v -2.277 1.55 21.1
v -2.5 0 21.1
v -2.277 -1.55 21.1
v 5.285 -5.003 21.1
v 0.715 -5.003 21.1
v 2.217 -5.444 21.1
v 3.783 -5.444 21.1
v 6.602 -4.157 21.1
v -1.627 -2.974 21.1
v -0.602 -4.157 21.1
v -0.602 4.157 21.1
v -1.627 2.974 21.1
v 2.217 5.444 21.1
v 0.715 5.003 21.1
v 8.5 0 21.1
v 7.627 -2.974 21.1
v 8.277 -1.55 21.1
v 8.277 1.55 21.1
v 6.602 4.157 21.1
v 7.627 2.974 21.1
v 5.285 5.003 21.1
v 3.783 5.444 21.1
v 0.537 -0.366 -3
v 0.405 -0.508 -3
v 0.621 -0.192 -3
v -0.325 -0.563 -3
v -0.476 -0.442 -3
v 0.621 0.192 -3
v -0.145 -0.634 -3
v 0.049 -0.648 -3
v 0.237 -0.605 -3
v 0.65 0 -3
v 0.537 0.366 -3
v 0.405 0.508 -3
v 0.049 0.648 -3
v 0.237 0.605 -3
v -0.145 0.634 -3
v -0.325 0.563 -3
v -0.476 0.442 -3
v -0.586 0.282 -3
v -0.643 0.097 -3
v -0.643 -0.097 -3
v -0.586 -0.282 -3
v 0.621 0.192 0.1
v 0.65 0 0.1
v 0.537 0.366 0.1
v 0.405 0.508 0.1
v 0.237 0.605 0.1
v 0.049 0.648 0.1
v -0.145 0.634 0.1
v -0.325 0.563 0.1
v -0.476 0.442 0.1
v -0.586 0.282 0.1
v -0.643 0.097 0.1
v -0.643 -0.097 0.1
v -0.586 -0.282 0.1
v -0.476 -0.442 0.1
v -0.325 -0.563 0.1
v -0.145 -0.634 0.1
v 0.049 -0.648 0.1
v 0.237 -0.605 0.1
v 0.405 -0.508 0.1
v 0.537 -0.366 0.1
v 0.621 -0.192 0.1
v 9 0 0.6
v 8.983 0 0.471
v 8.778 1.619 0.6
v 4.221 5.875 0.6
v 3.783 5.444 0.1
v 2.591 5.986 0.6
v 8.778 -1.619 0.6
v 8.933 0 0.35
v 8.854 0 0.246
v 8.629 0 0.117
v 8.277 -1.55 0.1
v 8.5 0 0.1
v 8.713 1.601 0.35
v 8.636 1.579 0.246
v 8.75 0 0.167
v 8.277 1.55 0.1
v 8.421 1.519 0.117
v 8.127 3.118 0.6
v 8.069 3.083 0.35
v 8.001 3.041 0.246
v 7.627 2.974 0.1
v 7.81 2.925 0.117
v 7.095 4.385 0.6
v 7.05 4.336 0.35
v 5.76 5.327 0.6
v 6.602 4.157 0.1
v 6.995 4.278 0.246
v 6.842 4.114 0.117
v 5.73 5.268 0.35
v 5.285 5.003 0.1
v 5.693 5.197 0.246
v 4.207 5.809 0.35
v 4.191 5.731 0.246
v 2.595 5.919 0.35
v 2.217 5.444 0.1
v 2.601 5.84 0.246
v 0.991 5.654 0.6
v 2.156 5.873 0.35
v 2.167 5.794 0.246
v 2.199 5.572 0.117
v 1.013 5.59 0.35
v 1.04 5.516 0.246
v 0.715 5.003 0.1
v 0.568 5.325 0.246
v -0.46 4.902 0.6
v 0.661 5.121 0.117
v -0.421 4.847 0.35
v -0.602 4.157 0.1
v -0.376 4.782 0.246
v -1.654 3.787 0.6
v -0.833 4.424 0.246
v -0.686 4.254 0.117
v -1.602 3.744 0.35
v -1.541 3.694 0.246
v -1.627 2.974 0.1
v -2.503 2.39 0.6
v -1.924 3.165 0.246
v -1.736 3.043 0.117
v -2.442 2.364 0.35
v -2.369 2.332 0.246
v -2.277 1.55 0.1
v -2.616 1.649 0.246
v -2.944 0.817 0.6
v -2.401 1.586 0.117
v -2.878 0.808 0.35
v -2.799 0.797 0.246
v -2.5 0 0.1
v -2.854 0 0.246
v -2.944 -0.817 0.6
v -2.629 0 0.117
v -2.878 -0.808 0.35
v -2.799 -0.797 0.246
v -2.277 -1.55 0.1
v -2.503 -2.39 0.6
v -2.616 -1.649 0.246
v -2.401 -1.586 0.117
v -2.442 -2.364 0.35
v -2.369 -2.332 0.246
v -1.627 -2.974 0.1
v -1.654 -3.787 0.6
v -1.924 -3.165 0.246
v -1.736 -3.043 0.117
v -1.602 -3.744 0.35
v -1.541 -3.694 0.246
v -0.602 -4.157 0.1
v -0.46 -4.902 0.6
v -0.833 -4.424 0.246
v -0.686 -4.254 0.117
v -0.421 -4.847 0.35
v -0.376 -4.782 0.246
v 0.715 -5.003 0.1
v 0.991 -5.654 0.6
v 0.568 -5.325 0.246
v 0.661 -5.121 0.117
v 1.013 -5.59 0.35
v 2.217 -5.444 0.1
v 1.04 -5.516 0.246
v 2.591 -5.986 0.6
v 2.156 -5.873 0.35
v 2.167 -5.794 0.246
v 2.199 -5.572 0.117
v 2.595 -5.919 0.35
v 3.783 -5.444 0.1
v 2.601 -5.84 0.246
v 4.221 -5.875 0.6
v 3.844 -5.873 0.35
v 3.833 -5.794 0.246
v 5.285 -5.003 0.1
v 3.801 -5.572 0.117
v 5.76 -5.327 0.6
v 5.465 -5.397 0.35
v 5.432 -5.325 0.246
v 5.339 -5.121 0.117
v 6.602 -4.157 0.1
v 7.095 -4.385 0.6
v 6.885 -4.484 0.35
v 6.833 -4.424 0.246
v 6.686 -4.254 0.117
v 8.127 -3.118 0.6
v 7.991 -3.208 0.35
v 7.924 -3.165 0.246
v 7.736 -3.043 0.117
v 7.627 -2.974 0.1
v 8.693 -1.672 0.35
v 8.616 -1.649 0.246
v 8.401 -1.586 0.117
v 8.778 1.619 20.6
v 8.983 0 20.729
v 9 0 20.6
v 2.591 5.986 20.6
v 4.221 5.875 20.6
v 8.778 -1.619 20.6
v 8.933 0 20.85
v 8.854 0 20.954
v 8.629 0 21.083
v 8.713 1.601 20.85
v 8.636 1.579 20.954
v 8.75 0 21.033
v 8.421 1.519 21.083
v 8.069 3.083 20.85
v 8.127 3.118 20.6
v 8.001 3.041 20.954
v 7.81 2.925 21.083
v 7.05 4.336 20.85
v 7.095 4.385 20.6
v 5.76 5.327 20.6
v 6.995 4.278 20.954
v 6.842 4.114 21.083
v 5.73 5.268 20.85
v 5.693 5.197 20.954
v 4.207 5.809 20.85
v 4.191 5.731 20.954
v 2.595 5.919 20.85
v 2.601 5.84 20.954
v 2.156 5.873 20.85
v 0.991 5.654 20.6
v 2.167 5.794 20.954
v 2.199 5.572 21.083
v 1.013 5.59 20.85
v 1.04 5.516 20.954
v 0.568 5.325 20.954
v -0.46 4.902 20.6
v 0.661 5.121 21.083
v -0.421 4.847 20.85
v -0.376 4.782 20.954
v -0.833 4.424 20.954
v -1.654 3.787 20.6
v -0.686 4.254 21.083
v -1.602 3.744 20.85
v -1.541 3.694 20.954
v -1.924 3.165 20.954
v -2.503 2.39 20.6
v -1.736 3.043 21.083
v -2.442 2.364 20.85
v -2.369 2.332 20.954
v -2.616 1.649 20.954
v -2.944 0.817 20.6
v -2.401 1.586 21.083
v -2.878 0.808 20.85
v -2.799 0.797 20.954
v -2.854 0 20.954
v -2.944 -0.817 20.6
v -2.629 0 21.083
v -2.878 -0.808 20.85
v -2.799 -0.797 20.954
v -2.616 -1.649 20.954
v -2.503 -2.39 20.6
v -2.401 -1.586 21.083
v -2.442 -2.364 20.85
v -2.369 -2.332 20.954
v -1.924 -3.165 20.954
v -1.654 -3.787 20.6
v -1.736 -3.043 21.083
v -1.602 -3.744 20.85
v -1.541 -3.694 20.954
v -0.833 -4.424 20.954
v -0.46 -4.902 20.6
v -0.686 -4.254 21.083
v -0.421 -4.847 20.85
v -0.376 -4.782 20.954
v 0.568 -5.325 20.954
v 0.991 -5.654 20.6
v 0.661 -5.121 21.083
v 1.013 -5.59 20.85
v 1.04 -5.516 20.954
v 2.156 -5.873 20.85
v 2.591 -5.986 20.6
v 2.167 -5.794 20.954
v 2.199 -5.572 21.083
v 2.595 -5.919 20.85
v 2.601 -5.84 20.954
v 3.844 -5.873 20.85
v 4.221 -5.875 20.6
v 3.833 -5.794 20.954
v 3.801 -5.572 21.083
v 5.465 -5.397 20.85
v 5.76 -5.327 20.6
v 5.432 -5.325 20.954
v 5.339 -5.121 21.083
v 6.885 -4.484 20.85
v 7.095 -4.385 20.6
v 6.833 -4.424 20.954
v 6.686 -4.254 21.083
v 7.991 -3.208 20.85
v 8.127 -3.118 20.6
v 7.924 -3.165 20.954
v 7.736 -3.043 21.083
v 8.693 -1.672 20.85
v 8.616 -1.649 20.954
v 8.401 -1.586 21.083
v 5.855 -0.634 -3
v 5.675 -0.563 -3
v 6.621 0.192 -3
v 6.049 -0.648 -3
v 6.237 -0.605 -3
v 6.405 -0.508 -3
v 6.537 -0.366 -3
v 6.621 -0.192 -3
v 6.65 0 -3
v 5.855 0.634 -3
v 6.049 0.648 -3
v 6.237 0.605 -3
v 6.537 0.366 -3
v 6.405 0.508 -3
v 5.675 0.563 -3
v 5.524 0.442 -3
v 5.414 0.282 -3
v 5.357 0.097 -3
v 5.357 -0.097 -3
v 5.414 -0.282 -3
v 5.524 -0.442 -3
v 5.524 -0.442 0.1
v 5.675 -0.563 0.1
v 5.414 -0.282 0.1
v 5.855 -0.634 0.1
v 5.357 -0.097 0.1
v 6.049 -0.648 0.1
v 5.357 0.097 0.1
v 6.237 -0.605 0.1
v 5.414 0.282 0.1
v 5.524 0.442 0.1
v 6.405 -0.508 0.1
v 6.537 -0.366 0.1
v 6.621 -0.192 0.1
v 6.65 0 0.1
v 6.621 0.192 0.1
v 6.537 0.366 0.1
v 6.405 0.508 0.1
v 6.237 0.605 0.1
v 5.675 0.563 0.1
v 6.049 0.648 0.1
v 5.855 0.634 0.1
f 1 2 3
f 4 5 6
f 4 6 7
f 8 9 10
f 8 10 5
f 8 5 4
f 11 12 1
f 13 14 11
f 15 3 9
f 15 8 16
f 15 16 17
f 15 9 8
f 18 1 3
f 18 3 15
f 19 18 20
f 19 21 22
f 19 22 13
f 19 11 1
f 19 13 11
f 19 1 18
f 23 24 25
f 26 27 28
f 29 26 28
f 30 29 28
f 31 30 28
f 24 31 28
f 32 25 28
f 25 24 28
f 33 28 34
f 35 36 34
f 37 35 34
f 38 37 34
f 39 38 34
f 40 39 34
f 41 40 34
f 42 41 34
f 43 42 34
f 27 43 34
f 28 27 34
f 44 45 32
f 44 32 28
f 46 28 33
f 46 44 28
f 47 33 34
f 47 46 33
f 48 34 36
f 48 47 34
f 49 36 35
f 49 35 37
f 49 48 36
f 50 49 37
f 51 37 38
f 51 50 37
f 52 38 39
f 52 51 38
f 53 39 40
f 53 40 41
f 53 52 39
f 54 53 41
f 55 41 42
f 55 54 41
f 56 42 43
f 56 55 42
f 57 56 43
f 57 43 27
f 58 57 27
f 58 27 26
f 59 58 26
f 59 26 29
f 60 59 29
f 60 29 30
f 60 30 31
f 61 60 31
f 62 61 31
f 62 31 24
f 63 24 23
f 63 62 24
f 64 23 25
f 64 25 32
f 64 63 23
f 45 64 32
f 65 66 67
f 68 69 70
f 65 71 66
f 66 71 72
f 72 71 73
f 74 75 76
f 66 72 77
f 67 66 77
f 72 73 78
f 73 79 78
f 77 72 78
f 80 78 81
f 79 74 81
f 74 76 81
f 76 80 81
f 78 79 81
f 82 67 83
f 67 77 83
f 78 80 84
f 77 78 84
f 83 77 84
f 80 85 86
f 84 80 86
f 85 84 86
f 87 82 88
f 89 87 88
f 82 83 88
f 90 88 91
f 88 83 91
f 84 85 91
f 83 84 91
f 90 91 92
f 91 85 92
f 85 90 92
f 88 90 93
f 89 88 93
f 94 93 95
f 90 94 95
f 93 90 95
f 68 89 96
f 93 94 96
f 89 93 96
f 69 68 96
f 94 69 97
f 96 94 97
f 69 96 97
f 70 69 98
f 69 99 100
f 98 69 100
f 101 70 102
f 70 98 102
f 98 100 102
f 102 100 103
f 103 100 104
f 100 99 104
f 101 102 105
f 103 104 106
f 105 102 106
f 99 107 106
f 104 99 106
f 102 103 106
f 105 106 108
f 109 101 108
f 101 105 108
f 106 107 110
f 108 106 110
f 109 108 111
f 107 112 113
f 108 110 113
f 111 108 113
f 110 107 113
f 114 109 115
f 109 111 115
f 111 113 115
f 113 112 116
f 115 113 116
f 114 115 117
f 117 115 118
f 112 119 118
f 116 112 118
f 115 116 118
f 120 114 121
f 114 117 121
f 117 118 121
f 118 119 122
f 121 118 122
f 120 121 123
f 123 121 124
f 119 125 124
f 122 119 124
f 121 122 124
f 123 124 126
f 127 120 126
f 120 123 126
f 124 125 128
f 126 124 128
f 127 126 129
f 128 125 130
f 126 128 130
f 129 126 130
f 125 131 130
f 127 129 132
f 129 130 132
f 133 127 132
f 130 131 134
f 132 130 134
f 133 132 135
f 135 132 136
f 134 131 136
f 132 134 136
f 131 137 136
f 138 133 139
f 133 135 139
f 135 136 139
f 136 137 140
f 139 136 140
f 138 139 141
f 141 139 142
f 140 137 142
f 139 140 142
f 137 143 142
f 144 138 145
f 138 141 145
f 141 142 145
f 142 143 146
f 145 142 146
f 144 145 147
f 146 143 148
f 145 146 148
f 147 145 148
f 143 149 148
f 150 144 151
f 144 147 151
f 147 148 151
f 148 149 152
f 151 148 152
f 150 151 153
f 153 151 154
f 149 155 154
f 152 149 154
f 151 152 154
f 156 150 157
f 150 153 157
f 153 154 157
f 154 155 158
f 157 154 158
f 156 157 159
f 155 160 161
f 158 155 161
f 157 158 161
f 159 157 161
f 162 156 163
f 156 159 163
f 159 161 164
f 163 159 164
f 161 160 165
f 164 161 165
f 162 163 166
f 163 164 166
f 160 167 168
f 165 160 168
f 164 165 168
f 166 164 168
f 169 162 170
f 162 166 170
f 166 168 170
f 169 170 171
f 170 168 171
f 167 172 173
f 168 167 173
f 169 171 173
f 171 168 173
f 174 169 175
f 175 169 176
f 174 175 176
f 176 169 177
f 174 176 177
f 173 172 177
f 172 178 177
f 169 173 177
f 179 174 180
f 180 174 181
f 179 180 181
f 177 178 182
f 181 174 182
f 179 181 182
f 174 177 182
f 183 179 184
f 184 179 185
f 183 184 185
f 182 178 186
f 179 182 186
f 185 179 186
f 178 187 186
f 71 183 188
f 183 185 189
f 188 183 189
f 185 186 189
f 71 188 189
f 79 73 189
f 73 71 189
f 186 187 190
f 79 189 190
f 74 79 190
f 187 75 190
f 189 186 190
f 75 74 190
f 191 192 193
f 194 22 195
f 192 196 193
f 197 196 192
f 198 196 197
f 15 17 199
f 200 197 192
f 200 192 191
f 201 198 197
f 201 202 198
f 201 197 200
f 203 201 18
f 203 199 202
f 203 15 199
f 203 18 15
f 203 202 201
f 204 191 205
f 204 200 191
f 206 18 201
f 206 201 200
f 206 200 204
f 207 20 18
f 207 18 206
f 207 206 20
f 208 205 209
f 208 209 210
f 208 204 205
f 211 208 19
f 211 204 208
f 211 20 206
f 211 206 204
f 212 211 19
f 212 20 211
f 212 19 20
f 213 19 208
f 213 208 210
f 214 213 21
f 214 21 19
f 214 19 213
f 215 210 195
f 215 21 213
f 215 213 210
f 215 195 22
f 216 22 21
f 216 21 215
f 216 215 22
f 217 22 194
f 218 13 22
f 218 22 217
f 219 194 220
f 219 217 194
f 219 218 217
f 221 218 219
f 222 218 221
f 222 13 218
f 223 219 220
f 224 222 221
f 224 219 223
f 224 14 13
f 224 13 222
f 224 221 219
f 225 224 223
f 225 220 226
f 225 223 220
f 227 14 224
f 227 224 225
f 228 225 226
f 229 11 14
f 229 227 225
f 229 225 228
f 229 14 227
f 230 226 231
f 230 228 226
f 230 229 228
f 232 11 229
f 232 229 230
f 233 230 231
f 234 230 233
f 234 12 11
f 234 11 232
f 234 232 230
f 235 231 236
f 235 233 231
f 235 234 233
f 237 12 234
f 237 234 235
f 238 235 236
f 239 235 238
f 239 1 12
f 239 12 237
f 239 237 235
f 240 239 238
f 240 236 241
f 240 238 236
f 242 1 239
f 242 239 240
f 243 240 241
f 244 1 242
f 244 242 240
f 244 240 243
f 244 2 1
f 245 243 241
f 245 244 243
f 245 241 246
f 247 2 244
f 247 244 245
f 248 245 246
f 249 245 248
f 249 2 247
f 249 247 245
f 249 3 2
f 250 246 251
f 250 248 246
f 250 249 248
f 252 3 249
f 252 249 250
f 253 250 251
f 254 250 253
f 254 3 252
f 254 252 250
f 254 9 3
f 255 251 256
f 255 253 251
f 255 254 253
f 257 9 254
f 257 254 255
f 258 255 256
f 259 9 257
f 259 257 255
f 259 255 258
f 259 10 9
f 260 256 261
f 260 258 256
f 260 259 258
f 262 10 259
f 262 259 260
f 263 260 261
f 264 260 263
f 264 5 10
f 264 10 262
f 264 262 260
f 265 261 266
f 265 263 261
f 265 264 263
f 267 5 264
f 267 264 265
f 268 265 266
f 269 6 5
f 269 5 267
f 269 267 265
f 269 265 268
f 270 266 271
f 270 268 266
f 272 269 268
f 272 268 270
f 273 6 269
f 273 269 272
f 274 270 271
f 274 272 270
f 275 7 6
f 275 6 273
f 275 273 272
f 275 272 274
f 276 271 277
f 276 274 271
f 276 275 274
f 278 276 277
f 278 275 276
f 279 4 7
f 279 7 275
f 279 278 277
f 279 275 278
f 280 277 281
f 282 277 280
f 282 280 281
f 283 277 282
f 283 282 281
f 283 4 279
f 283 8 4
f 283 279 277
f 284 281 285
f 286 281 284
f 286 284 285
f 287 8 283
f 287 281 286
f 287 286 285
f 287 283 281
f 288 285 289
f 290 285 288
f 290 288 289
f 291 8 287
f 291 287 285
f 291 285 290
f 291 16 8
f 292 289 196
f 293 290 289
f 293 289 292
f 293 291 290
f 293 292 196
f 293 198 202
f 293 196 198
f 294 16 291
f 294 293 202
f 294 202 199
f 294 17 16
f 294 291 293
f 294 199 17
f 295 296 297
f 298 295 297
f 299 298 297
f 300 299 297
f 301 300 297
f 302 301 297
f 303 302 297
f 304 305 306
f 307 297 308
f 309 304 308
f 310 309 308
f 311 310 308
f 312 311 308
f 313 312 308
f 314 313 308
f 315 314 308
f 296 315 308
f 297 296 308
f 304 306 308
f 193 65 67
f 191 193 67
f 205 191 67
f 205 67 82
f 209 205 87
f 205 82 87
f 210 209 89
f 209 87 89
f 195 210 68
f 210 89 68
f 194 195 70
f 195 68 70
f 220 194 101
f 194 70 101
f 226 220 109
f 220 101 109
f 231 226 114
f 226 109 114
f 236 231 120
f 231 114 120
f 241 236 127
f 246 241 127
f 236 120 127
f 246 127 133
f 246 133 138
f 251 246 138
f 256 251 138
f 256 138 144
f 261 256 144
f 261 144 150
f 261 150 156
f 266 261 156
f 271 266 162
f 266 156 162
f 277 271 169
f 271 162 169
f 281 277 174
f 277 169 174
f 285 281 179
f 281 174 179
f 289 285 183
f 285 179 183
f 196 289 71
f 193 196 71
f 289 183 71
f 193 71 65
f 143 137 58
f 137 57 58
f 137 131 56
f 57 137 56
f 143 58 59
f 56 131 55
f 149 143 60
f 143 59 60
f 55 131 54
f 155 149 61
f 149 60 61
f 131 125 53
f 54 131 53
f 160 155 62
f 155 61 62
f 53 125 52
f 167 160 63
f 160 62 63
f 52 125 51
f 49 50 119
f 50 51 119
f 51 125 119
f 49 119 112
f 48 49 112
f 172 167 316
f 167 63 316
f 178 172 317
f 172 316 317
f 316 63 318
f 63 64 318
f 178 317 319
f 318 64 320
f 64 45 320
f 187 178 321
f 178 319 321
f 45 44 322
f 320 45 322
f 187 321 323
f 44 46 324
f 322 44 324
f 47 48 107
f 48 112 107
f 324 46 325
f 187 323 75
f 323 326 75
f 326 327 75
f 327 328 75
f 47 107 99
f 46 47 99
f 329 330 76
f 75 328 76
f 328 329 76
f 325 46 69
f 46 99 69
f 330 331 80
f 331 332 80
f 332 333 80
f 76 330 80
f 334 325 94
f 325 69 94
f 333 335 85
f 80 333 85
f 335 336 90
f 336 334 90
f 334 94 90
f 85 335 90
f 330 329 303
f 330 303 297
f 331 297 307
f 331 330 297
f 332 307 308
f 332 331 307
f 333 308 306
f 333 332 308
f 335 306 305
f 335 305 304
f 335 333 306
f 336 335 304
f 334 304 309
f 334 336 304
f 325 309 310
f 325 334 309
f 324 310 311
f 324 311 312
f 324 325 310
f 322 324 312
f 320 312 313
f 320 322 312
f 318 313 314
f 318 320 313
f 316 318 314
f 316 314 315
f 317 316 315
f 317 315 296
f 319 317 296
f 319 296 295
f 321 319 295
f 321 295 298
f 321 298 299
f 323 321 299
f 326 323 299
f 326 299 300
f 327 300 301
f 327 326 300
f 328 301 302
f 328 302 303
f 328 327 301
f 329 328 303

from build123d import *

# Parameters (mm, degrees)
SKETCH001_R       = 0.65
PAD001_DEPTH      = 10.5
PAD001_DEPTH_BACK = 3.5
SKETCH_R          = 6
PAD_DEPTH         = 21
FILLET_R          = 0.5


with BuildPart() as pad001:
    # Sketch001 → Pad001 (new body, two sides)
    with BuildSketch(Plane.XY.offset(0.5)) as pad001_sk:
        Circle(SKETCH001_R)
        with Locations((6, 0)):
            Circle(SKETCH001_R)
    extrude(amount=PAD001_DEPTH)
    extrude(pad001_sk.sketch, amount=-PAD001_DEPTH_BACK)


with BuildPart() as l_radial_d12_0mm_p6_00mm_murata_1900r:
    # Sketch → Pad (new body)
    with BuildSketch(Plane.XY.offset(0.1)):
        with Locations((3, 0)):
            Circle(SKETCH_R)
    extrude(amount=PAD_DEPTH)

    # Fillet
    fillet_edges = [l_radial_d12_0mm_p6_00mm_murata_1900r.edges().sort_by_distance(p)[0] for p in [
        (-3, 0, 0.1),
        (-3, 0, 21.1),
    ]]
    fillet(fillet_edges, radius=FILLET_R)

    # Fillet_mp_cp: union Pad001
    add(pad001.part)


solid = l_radial_d12_0mm_p6_00mm_murata_1900r.part
